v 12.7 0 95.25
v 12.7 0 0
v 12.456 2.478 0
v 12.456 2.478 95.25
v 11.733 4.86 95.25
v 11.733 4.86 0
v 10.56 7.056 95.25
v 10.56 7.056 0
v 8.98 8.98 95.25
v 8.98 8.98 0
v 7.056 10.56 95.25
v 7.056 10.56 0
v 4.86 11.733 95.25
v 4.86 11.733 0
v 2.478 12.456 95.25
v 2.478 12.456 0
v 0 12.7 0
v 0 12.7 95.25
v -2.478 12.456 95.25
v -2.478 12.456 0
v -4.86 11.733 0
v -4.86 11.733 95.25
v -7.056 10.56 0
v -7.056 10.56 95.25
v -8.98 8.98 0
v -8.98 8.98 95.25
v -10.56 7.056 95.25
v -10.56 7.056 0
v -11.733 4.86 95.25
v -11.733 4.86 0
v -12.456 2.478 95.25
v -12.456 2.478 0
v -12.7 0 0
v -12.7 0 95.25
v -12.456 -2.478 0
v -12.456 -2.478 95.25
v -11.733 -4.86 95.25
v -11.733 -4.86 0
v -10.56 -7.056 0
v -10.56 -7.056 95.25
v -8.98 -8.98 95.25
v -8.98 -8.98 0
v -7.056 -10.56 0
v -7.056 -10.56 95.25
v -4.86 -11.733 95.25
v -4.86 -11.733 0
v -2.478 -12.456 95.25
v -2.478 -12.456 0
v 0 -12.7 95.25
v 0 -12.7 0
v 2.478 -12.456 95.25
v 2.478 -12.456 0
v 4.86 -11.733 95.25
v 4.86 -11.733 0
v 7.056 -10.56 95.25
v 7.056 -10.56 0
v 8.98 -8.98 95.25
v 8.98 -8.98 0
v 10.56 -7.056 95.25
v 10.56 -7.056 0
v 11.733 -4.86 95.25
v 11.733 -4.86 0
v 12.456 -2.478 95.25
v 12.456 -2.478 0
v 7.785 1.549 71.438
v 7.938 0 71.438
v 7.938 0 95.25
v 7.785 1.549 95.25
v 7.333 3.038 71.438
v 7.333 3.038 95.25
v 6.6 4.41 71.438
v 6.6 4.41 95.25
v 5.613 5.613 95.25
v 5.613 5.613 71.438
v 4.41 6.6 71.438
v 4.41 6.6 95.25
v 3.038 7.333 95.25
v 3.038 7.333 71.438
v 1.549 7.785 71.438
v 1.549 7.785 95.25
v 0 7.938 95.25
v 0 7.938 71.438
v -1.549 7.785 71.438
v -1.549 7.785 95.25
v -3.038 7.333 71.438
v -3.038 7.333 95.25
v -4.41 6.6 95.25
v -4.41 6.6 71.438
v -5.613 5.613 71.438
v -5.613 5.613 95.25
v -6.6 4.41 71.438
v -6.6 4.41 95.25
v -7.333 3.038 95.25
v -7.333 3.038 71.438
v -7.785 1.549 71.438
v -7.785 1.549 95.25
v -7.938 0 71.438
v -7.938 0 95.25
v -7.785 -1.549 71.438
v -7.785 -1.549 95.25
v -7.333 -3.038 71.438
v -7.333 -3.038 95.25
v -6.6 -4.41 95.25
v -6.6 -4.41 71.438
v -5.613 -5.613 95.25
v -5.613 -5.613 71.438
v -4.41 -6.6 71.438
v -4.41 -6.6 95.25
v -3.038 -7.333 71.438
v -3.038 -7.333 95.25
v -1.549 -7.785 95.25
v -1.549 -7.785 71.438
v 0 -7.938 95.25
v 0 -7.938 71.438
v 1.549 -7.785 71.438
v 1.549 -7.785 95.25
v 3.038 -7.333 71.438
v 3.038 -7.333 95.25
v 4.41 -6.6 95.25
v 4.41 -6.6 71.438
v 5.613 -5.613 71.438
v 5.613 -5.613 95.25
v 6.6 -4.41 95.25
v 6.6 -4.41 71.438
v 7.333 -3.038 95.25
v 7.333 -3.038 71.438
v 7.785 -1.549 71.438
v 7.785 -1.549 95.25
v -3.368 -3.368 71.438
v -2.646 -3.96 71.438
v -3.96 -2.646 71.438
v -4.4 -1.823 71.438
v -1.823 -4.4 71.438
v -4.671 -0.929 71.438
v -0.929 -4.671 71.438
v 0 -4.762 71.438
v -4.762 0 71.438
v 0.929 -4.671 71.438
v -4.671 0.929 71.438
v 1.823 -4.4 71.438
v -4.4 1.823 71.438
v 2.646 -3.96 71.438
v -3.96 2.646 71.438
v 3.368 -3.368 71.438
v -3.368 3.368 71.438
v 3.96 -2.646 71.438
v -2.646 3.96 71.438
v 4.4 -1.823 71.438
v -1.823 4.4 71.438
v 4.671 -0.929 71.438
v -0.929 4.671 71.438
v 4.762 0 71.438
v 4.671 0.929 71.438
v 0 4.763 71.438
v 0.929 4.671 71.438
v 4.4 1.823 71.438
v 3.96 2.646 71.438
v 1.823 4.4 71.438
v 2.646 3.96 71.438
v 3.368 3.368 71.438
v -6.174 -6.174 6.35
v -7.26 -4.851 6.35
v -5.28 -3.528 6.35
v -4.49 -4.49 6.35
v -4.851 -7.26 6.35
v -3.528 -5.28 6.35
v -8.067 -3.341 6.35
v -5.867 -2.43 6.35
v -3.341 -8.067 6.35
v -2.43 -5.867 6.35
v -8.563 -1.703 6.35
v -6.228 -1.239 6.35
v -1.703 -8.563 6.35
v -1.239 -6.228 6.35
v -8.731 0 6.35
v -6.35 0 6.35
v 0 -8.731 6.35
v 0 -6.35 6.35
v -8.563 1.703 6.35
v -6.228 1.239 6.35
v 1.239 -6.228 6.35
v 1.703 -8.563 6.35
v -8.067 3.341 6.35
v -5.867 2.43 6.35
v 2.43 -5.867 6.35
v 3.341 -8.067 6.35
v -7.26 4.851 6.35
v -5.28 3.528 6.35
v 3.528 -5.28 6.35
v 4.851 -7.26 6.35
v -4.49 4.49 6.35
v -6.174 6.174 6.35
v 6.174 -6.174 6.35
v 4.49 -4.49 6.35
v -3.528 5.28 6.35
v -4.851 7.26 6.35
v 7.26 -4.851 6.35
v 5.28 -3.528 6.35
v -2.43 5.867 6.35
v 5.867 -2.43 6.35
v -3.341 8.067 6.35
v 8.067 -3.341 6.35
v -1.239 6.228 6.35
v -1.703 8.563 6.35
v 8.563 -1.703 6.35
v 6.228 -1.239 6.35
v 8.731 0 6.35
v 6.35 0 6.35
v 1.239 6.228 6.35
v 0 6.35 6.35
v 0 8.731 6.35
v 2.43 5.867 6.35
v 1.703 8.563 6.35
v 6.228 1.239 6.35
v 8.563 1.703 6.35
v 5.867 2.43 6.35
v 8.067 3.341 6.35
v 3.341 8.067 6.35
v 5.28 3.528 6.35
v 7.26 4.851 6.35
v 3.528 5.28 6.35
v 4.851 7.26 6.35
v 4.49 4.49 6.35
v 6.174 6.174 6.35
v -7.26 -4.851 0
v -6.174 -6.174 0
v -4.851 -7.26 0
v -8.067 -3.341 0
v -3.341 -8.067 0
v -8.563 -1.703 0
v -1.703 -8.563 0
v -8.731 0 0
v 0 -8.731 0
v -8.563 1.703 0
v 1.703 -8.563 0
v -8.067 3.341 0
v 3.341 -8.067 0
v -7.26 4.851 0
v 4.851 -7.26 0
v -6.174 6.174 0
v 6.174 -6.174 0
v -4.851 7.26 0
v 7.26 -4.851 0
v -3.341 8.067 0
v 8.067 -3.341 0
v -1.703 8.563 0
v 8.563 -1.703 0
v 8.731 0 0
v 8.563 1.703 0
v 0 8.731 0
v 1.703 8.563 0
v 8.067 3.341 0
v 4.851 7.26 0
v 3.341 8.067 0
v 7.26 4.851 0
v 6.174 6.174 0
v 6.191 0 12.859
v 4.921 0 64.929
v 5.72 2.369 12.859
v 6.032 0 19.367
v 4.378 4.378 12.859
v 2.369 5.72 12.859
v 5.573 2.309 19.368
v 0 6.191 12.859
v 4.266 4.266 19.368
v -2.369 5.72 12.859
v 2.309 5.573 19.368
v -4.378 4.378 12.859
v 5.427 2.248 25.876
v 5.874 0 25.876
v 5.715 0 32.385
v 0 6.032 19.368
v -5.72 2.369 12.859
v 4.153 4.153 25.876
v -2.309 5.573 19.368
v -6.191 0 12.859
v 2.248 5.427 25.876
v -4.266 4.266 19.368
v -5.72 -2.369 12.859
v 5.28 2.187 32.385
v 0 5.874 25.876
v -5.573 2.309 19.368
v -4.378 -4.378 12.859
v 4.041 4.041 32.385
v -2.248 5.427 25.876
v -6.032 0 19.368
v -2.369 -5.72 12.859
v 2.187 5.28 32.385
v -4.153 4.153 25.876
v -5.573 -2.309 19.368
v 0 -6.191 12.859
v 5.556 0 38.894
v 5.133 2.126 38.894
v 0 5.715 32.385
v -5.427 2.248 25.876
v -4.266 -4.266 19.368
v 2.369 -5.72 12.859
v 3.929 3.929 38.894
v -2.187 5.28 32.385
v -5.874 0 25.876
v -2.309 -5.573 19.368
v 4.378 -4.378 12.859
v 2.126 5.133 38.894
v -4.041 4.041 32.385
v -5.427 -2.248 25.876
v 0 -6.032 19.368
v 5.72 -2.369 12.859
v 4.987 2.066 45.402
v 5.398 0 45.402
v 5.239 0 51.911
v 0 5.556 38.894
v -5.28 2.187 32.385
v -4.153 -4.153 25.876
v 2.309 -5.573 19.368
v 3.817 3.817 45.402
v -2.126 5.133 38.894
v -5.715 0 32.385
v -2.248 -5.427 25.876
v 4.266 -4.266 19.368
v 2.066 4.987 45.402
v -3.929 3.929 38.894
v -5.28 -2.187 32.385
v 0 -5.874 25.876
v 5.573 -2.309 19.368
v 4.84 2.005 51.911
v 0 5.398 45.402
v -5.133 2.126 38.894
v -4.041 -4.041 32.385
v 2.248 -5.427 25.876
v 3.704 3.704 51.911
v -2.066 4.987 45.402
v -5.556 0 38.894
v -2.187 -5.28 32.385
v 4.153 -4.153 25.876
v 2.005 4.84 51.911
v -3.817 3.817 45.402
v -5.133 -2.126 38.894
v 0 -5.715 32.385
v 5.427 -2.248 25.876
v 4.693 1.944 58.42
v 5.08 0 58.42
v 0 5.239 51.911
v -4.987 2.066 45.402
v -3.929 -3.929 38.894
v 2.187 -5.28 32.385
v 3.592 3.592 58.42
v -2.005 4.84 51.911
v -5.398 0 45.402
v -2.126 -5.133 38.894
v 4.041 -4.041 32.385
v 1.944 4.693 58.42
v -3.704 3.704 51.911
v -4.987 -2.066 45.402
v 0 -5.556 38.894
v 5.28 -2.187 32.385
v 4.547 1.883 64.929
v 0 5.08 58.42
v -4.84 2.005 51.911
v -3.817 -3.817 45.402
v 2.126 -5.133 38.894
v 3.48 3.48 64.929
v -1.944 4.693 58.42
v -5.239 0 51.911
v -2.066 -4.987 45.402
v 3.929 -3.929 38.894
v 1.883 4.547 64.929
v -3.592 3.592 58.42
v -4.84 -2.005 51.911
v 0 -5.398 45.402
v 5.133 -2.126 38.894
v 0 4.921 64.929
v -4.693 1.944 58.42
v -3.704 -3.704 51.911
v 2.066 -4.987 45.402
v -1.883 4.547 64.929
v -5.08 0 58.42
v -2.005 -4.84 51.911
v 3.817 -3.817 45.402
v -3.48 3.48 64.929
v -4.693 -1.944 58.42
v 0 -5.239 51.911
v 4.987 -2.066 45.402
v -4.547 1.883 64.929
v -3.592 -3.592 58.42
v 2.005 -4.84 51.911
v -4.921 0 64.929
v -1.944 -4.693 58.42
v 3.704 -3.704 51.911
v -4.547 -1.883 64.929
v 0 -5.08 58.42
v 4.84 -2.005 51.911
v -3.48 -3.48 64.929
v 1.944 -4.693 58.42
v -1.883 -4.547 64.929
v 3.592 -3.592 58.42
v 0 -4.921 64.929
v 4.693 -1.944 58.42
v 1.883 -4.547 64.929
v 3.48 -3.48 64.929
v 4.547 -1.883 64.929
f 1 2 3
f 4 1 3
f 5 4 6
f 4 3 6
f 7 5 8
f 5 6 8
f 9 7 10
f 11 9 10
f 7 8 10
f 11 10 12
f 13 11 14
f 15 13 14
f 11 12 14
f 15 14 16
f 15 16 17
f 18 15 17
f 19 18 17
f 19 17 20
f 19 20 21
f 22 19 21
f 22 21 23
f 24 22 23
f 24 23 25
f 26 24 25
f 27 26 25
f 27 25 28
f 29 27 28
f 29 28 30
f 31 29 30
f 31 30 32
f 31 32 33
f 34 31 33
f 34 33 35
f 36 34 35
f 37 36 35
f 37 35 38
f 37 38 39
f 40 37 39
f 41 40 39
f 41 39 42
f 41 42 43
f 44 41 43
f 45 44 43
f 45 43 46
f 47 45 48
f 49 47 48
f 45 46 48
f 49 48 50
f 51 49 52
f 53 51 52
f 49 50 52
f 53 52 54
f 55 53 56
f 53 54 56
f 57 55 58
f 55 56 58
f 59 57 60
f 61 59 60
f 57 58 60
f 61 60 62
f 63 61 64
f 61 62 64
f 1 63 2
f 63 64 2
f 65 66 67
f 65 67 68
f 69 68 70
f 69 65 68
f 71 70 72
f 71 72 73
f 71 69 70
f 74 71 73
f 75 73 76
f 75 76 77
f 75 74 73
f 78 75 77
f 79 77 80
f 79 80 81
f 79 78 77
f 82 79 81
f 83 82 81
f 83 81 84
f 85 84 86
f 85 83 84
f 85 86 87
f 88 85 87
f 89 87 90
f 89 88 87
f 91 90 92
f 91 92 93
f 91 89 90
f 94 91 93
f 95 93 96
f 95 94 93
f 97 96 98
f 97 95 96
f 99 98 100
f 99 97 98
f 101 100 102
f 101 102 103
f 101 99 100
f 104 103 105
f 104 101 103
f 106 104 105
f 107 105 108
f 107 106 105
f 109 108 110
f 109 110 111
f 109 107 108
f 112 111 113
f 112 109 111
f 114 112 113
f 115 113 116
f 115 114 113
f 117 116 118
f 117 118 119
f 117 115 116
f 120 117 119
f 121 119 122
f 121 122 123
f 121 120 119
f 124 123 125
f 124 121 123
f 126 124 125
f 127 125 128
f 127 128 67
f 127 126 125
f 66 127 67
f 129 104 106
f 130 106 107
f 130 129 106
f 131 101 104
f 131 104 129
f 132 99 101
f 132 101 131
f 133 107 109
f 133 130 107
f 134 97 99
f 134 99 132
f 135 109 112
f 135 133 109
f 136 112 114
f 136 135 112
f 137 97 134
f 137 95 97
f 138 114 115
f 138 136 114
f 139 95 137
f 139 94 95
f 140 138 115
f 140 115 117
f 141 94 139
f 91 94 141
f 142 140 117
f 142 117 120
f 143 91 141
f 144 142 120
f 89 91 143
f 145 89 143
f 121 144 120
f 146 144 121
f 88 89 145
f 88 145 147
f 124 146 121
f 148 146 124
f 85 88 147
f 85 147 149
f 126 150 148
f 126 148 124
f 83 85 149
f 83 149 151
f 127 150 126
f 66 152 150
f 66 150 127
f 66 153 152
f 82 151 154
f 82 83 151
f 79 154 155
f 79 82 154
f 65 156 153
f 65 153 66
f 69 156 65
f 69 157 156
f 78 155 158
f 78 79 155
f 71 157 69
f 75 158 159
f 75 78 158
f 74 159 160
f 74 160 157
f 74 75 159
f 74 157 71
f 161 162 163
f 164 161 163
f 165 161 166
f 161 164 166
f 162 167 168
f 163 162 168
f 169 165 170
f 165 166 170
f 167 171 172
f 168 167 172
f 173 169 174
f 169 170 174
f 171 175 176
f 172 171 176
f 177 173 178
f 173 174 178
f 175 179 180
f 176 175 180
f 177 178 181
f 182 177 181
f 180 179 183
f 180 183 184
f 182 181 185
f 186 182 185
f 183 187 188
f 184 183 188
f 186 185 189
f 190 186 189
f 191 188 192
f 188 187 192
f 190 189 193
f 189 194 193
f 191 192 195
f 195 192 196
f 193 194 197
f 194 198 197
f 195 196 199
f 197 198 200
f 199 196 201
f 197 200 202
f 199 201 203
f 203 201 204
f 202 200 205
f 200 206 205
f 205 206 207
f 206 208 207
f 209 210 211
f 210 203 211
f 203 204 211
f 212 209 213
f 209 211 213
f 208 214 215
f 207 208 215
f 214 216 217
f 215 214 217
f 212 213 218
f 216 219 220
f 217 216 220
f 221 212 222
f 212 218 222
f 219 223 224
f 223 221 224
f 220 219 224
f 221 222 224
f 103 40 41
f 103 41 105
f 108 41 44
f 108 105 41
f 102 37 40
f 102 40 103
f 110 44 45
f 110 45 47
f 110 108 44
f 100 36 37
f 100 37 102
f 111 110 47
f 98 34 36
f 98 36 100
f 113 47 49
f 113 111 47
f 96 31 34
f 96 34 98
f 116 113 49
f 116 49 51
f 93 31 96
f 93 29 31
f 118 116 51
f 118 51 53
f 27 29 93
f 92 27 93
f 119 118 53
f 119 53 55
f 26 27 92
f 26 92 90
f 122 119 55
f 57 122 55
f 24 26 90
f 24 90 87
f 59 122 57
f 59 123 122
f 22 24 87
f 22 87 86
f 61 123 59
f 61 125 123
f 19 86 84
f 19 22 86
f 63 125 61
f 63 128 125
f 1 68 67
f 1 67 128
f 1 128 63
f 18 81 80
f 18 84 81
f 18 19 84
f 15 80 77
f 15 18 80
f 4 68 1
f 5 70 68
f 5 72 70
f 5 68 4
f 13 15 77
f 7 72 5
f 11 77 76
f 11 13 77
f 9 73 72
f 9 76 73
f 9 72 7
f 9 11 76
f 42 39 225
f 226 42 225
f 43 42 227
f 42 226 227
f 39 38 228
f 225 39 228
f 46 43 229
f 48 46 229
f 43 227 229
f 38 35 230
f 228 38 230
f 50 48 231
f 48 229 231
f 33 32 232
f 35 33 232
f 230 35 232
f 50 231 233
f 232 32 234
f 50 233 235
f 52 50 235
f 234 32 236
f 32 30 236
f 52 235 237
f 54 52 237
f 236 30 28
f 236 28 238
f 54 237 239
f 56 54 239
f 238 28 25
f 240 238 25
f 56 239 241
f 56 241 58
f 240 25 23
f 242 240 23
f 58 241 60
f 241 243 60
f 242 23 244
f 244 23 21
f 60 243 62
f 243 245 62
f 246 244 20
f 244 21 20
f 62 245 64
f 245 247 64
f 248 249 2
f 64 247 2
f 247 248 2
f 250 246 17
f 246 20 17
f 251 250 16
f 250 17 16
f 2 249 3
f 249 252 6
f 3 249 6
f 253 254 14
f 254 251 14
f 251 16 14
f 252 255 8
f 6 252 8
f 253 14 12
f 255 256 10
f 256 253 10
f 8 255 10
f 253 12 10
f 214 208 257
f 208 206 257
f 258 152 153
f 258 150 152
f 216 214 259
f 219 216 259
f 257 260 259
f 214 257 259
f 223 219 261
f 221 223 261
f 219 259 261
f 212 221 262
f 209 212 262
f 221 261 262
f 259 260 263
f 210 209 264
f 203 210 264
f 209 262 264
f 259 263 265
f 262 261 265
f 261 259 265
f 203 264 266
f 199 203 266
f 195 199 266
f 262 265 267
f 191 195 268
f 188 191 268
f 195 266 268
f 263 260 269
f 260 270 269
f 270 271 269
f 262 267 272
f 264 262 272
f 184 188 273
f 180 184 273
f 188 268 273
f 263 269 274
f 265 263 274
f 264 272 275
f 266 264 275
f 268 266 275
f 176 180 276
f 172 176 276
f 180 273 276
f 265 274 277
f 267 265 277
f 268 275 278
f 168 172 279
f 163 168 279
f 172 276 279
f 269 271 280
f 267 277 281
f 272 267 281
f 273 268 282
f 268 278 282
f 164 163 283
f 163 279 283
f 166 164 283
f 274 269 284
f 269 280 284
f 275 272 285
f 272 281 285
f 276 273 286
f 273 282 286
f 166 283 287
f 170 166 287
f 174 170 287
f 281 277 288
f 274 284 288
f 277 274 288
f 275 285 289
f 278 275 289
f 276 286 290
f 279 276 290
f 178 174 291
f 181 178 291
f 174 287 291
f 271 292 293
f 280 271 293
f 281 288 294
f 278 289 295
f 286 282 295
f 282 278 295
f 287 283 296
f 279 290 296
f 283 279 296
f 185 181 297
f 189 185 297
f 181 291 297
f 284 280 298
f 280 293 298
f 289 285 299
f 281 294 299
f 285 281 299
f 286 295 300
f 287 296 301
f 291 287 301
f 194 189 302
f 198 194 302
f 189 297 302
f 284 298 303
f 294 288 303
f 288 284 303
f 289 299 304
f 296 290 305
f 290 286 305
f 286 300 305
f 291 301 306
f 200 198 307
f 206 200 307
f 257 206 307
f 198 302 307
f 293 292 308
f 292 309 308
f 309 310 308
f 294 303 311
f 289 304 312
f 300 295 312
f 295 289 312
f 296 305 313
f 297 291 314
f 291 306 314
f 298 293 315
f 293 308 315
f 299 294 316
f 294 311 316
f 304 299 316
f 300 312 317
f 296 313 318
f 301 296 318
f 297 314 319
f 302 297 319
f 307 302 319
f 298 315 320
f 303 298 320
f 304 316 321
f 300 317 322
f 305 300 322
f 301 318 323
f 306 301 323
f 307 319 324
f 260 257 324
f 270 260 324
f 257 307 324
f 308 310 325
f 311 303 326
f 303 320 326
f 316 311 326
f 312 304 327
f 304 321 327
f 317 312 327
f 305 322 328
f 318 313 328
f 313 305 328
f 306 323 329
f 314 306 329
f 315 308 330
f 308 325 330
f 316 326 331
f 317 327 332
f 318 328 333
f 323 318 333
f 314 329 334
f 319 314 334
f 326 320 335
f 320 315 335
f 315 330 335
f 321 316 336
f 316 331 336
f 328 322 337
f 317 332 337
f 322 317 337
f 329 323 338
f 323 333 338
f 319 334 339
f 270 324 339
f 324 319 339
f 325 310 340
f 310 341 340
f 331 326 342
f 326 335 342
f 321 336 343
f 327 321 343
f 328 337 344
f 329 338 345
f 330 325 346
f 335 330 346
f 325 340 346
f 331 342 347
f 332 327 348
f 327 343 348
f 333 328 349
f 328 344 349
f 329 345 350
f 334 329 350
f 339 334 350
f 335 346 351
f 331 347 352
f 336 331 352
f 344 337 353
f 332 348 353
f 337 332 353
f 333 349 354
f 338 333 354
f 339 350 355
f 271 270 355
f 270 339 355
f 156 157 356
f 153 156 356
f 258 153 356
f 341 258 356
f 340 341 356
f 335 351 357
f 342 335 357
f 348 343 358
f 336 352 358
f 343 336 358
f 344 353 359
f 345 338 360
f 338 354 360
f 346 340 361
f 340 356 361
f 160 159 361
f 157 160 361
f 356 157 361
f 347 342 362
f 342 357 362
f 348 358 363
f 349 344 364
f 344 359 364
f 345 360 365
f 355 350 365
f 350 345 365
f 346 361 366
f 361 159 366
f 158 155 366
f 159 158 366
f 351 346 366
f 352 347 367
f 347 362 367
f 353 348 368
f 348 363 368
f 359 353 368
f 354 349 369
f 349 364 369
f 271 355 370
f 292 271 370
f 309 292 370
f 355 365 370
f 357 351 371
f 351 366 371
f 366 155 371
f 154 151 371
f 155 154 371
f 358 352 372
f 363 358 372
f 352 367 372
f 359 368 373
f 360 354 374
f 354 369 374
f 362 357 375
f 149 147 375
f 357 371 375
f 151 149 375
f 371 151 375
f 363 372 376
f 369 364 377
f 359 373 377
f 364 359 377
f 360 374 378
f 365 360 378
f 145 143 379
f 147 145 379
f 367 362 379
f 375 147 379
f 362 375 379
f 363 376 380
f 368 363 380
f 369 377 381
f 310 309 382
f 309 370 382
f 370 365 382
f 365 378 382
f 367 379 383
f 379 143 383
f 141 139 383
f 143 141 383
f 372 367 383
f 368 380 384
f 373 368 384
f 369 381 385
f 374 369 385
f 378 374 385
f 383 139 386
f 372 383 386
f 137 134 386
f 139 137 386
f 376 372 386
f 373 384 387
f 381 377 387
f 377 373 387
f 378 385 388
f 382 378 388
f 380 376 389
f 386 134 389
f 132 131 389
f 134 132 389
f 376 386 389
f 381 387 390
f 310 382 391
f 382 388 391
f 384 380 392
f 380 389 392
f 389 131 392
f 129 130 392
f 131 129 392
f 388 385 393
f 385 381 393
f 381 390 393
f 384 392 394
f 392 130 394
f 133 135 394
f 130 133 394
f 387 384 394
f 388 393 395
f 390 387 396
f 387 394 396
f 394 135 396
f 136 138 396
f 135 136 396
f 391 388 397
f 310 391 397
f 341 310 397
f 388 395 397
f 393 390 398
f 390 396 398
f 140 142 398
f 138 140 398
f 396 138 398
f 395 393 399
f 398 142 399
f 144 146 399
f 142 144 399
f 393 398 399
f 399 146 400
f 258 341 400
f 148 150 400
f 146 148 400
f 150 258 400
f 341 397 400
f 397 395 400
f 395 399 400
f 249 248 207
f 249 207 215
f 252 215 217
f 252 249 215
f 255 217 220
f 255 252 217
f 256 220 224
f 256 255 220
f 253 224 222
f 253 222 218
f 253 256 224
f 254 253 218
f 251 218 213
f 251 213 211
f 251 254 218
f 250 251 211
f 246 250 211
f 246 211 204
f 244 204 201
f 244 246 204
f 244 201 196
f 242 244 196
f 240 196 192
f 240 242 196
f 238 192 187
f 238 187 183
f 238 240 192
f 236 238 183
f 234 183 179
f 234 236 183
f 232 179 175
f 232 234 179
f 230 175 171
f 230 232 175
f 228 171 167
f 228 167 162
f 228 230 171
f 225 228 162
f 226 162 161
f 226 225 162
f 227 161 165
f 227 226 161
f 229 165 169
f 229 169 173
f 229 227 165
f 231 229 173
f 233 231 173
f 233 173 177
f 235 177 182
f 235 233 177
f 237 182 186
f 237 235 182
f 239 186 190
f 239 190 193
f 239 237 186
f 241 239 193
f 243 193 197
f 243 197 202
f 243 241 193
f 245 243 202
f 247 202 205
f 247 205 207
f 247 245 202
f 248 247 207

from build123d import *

# Parameters (mm, degrees)
SKETCH1_R           = 12.7
SKETCH1_R_2         = 8.73125
BOSS_EXTRUDE1_DEPTH = 6.35
SKETCH2_R           = 12.7
SKETCH2_R_2         = 7.9375
BOSS_EXTRUDE2_DEPTH = 23.8125
SKETCH5_R           = 12.7
BOSS_EXTRUDE4_DEPTH = 65.0875
SKETCH6_R           = 6.35
SKETCH3_R           = 4.7625


with BuildPart() as part:
    # Sketch1 → Boss-Extrude1 (new body)
    with BuildSketch(Plane.XY):
        Circle(SKETCH1_R)
        Circle(SKETCH1_R_2, mode=Mode.SUBTRACT)
    extrude(amount=BOSS_EXTRUDE1_DEPTH)



with BuildPart() as body_2:
    # Sketch2 → Boss-Extrude2 (new body)
    with BuildSketch(Plane.XY.offset(71.4375)):
        Circle(SKETCH2_R)
        Circle(SKETCH2_R_2, mode=Mode.SUBTRACT)
    extrude(amount=BOSS_EXTRUDE2_DEPTH)


with BuildPart() as part_1:
    add(part.part)

    add(body_2.part)  # Boss-Extrude4 merges body 2
    # Sketch5 → Boss-Extrude4 (add)
    with BuildSketch(Plane.XY.offset(6.35)):
        Circle(SKETCH5_R)
    extrude(amount=BOSS_EXTRUDE4_DEPTH)

    # Sketch6 → Cut-Loft1 section 0
    with BuildSketch(Plane.XY.offset(6.35)):
        Circle(SKETCH6_R)
    # Sketch3 → Cut-Loft1 section 1
    with BuildSketch(Plane(origin=(0, 0, 71.4375), x_dir=(-1, 0, 0), z_dir=(0, 0, -1))):
        Circle(SKETCH3_R)
    loft(mode=Mode.SUBTRACT)


solid = part_1.part
